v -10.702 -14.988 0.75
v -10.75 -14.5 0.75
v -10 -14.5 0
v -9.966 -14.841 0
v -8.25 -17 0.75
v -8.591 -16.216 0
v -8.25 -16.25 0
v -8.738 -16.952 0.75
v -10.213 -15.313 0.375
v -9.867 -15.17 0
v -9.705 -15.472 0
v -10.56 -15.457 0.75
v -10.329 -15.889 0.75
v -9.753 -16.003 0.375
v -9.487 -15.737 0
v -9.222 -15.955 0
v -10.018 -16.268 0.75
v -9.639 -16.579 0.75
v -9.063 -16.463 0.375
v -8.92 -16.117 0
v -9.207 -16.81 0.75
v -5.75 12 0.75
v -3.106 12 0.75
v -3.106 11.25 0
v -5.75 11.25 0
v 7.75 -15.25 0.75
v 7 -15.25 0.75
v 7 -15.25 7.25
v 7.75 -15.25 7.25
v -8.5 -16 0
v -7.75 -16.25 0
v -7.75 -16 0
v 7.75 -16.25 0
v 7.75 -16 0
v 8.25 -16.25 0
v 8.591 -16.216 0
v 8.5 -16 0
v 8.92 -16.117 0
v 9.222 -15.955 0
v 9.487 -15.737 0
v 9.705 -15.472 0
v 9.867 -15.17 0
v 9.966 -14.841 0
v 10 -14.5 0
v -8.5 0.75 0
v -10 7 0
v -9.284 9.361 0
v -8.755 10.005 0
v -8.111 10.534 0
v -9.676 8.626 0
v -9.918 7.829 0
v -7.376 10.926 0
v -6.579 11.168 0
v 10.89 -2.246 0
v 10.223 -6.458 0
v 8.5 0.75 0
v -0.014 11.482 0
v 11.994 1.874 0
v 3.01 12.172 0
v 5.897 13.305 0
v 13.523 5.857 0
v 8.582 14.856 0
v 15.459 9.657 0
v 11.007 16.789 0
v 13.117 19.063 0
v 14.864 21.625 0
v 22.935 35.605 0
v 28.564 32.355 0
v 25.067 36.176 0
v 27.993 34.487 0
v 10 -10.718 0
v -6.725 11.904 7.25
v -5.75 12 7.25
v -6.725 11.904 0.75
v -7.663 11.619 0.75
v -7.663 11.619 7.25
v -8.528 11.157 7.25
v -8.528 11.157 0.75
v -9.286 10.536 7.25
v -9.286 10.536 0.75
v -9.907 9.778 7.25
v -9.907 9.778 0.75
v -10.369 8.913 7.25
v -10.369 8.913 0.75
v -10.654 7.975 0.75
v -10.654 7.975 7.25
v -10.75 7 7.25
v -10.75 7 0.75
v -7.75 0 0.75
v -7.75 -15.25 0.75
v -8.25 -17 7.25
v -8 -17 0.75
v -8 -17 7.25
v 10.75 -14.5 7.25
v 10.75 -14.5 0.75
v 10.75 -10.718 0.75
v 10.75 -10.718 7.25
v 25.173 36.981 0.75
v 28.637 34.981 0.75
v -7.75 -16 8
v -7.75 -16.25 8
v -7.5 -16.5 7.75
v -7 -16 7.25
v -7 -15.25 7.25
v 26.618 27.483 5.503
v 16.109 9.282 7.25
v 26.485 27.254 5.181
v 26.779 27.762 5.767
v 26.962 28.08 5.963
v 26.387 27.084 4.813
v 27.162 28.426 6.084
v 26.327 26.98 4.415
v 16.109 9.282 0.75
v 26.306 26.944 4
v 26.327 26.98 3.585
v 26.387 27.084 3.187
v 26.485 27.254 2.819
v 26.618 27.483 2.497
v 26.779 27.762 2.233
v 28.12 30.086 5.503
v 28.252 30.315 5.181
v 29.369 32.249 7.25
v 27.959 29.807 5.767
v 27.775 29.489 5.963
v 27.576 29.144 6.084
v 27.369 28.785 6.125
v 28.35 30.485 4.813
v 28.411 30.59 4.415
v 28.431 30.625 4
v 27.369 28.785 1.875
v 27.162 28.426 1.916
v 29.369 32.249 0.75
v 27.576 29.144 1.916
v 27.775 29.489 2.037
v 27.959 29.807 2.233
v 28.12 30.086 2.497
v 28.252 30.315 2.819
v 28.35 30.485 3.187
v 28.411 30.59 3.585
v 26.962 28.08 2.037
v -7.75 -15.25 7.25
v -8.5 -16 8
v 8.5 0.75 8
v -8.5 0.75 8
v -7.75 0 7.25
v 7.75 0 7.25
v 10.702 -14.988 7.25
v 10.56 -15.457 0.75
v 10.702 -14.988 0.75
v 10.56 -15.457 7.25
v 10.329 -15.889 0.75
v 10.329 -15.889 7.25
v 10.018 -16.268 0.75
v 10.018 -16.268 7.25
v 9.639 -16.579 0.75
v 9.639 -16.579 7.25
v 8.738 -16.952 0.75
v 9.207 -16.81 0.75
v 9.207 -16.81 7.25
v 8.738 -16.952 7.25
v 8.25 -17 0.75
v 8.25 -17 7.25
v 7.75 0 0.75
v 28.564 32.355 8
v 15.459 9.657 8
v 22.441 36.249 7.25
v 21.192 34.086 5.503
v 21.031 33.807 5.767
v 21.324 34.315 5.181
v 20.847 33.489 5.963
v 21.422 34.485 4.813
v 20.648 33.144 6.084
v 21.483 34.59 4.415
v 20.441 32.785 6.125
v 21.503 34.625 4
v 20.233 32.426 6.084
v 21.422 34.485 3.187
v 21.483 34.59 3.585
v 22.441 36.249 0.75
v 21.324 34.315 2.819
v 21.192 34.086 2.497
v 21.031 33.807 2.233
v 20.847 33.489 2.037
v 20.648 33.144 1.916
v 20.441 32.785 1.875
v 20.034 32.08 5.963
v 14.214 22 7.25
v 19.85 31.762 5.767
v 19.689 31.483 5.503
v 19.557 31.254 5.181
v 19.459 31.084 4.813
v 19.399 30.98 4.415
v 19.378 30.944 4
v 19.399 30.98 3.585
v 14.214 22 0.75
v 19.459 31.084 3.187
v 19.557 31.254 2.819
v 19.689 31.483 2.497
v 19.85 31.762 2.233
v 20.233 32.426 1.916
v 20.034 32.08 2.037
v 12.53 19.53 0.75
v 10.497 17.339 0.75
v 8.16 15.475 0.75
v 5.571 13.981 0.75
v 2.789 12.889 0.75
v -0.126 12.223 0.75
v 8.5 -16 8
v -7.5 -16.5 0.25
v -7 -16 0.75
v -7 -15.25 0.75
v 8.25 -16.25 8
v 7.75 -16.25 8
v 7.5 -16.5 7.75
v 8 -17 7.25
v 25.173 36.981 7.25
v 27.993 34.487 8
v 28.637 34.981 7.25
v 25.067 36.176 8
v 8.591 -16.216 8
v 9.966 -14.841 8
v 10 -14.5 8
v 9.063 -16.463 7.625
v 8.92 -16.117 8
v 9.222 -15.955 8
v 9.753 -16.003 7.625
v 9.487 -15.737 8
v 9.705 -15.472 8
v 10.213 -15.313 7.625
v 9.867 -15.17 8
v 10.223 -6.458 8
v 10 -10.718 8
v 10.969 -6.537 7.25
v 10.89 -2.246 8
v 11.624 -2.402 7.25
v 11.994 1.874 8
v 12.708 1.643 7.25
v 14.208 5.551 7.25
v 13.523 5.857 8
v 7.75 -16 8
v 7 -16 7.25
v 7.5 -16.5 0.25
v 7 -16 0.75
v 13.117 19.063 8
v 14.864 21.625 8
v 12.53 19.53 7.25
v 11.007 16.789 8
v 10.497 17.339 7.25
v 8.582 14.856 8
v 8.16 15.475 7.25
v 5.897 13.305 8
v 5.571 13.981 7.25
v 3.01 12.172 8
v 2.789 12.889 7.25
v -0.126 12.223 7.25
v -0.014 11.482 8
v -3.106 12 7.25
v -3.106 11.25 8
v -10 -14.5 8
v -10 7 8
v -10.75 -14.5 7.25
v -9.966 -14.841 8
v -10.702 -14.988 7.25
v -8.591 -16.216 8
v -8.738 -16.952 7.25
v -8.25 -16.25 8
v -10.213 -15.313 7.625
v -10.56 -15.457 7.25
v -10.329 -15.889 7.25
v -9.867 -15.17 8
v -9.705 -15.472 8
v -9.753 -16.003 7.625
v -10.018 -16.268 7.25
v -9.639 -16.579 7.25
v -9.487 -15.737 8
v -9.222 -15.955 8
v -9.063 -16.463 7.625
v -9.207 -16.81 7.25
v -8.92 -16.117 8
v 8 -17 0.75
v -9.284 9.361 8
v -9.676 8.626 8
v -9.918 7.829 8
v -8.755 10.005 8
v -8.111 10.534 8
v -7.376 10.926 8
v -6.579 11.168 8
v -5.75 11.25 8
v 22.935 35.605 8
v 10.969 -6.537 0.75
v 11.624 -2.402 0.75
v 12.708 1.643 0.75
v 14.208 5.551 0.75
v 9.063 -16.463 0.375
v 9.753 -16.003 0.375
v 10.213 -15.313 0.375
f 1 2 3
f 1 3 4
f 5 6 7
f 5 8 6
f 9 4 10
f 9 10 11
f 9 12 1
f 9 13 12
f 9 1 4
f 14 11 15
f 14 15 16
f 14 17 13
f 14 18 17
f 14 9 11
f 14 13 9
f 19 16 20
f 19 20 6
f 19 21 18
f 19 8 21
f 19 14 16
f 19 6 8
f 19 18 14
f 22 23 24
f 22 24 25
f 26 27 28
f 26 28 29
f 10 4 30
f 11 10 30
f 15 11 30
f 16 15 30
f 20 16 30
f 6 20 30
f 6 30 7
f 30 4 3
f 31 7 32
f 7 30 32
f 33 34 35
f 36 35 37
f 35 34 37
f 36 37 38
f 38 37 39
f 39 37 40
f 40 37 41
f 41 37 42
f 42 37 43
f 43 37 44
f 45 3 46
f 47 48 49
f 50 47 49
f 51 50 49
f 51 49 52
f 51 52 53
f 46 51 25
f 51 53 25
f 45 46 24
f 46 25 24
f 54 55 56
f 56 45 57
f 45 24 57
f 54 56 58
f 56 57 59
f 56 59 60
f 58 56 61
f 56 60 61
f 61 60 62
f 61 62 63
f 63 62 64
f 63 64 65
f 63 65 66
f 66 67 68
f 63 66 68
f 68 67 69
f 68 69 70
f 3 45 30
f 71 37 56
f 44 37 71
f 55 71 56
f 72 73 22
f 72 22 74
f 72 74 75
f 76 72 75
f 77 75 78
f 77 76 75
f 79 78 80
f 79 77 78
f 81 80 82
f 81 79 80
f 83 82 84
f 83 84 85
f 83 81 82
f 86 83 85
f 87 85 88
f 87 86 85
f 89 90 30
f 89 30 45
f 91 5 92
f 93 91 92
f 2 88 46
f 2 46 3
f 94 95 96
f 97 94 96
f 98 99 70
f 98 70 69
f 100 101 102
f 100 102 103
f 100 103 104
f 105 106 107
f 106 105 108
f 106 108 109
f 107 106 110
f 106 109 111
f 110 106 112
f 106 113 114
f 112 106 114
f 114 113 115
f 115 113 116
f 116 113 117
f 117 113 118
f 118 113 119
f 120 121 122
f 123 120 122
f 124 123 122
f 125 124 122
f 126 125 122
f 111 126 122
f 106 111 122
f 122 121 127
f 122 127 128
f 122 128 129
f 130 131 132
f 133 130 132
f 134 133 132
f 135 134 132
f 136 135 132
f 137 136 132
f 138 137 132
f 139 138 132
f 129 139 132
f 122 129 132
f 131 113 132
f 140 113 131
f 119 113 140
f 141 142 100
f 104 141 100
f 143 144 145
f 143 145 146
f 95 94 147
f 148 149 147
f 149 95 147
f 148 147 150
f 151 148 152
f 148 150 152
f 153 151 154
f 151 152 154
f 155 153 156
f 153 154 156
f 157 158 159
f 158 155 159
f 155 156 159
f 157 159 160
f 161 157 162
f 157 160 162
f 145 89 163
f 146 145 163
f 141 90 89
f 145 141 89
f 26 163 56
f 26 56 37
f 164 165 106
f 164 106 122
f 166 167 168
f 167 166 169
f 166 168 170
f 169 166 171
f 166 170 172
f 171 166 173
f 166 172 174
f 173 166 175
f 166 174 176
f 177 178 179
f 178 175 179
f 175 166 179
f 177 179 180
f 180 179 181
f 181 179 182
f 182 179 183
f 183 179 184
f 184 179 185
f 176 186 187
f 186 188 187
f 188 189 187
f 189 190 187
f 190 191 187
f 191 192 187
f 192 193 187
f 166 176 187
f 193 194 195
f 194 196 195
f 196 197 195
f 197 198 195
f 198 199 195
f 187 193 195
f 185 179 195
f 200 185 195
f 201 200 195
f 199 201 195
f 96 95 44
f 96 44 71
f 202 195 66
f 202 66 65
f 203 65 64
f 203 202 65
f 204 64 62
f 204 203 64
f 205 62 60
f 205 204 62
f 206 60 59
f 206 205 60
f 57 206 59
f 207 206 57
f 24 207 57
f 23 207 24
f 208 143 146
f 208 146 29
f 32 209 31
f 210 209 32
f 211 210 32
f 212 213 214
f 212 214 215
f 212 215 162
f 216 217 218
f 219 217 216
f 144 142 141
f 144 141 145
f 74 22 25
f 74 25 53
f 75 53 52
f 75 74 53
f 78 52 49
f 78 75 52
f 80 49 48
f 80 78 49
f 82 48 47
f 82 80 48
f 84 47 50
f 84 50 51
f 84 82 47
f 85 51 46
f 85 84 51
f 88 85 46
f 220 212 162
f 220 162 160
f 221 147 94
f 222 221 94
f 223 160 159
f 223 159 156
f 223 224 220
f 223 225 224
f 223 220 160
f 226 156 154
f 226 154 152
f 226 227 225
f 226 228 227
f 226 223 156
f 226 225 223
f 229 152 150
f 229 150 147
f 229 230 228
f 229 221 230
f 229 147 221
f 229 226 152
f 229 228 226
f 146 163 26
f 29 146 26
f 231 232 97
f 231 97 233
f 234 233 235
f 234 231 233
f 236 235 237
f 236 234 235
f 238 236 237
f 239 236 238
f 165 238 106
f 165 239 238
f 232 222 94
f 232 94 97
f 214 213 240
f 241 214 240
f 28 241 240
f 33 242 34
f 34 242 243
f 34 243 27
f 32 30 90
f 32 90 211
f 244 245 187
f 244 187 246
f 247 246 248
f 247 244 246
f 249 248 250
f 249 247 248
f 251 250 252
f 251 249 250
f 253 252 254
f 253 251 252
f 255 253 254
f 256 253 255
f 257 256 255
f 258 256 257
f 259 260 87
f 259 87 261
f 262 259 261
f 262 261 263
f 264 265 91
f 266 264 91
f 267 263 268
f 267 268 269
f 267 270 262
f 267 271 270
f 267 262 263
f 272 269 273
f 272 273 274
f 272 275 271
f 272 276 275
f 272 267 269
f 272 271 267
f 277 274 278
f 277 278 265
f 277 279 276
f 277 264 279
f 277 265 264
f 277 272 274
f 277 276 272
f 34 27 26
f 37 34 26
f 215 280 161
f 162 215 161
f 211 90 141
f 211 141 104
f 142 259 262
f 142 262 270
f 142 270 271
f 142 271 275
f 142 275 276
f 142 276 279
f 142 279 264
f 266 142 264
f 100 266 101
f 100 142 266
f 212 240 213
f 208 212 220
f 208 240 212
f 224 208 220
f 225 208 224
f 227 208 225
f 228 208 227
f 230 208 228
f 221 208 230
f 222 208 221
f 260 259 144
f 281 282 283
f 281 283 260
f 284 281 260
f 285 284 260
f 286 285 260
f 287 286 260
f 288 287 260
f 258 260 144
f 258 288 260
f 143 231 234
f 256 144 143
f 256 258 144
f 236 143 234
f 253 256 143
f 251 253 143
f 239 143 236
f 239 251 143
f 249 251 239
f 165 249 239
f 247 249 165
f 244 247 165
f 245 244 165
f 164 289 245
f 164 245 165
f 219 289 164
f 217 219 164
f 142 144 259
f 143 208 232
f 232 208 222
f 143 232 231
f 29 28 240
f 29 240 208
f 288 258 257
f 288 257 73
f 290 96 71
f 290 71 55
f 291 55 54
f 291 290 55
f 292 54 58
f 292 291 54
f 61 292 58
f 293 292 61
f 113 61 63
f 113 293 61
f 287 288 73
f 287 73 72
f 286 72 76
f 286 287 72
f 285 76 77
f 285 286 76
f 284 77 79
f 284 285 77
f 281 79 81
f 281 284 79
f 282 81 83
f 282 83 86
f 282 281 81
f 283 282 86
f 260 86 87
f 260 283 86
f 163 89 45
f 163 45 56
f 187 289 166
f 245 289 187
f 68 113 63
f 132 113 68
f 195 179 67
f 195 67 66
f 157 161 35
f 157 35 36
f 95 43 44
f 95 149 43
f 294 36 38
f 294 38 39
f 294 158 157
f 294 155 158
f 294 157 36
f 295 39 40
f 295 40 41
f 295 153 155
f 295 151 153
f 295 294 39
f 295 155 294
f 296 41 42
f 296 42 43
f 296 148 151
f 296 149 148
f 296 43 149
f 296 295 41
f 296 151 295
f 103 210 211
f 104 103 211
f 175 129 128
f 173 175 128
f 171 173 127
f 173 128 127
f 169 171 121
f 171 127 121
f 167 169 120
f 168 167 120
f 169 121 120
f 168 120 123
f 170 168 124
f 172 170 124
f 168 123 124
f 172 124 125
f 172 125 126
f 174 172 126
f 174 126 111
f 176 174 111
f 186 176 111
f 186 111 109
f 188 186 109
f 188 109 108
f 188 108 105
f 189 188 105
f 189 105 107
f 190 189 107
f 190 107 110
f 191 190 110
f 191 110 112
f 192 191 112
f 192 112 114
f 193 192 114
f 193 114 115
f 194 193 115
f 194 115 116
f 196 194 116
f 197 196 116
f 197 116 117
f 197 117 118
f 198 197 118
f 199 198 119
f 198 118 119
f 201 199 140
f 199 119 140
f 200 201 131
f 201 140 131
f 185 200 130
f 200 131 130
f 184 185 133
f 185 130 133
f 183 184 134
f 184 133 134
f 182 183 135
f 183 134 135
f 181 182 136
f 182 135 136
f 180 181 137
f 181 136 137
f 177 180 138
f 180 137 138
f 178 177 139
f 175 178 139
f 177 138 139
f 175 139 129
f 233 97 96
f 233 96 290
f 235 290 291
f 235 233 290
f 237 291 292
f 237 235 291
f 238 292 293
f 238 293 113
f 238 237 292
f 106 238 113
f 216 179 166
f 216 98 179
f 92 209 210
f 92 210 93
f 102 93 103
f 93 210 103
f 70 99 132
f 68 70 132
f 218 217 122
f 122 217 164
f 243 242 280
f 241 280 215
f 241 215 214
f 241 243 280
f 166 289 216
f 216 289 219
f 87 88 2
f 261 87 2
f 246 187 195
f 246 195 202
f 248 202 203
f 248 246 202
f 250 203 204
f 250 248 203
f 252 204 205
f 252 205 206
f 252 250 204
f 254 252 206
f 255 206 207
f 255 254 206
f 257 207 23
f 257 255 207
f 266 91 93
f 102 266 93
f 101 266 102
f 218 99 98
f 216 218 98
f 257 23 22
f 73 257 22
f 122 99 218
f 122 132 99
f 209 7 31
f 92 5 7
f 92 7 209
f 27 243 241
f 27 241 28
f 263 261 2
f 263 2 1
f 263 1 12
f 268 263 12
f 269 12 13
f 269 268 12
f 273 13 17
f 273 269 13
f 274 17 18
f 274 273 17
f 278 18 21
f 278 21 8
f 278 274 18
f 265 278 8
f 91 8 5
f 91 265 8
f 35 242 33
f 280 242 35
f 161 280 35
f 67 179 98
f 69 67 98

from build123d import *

# Parameters (mm, degrees)
F0_W     = 0.75
F0_H     = 1.75
F1_DEPTH = 8
F2_R     = 40
F3_R     = 20
F4_R     = 5
F5_R     = 2.5
F6_SIZE  = 2
F7_R     = 2.125
F8_DEPTH = 37.1109272381
F9_SIZE  = 0.75
F10_SIZE = 1


with BuildPart() as f1:
    # F0 (on Top) → F1 (new body)
    with BuildSketch(Plane.XY):
        Polygon((-10.75, -17), (-7.75, -17), (-7.75, -15.25), (-7.75, 0), (7.75, 0), (7.75, -15.25), (7.75, -17), (10.75, -17), (10.75, 0), (30.3688021535, 33.9807621135), (23.4405989232, 37.9807621135), (8.4405989232, 12), (-10.75, 12), align=None)
        with Locations((-7.375, -16.125)):
            Rectangle(F0_W, F0_H)
        with Locations((7.375, -16.125)):
            Rectangle(F0_W, F0_H)
    extrude(amount=F1_DEPTH)

    # F2
    f2_edges = [f1.edges().sort_by_distance(p)[0] for p in [
        (10.75, 0, 4),
    ]]
    fillet(f2_edges, radius=F2_R)

    # F3
    f3_edges = [f1.edges().sort_by_distance(p)[0] for p in [
        (8.440599, 12, 4),
    ]]
    fillet(f3_edges, radius=F3_R)

    # F4
    f4_edges = [f1.edges().sort_by_distance(p)[0] for p in [
        (-10.75, 12, 4),
    ]]
    fillet(f4_edges, radius=F4_R)

    # F5
    f5_edges = [f1.edges().sort_by_distance(p)[0] for p in [
        (10.75, -17, 4),
        (-10.75, -17, 4),
    ]]
    fillet(f5_edges, radius=F5_R)

    # F6
    f6_edges = [f1.edges().sort_by_distance(p)[0] for p in [
        (30.368802, 33.980762, 4),
        (23.440599, 37.980762, 4),
    ]]
    chamfer(f6_edges, length=F6_SIZE)

    # F7 (on face) → F8 (cut, through all)
    with BuildSketch(Plane(origin=(8.0625, -4.6548865453, 0), x_dir=(0.5, 0.8660254038, 0), z_dir=(0.8660254038, -0.5, 0))):
        with Locations((38.612604307, 4)):
            Circle(F7_R)
    extrude(amount=-F8_DEPTH, mode=Mode.SUBTRACT)

    # F9
    f9_edges = [f1.edges().sort_by_distance(p)[0] for p in [
        (18.32735, 29.124356, 8),
        (23.806624, 36.614737, 8),
        (6.893594, 14.679492, 8),
        (26.904701, 35.980762, 8),
        (-4.428203, 12, 8),
        (29.002777, 33.614737, 8),
        (-9.285534, 10.535534, 8),
        (22.738893, 20.765372, 8),
        (-10.75, -3.75, 8),
        (12.112967, -0.365206, 8),
        (-10.017767, -16.267767, 8),
        (10.75, -12.608984, 8),
        (-7.625, -17, 8),
        (10.017767, -16.267767, 8),
        (-7, -16.125, 8),
        (7.625, -17, 8),
        (-7.375, -15.25, 8),
        (7, -16.125, 8),
        (-7.75, -7.625, 8),
        (7.375, -15.25, 8),
        (0, 0, 8),
        (7.75, -7.625, 8),
        (18.32735, 29.124356, 0),
        (23.806624, 36.614737, 0),
        (6.893594, 14.679492, 0),
        (26.904701, 35.980762, 0),
        (-4.428203, 12, 0),
        (29.002777, 33.614737, 0),
        (-9.285534, 10.535534, 0),
        (22.738893, 20.765372, 0),
        (-10.75, -3.75, 0),
        (12.112967, -0.365206, 0),
        (-10.017767, -16.267767, 0),
        (10.75, -12.608984, 0),
        (-7.625, -17, 0),
        (10.017767, -16.267767, 0),
        (-7, -16.125, 0),
        (7.625, -17, 0),
        (-7.375, -15.25, 0),
        (7, -16.125, 0),
        (-7.75, -7.625, 0),
        (7.375, -15.25, 0),
        (0, 0, 0),
        (7.75, -7.625, 0),
    ]]
    chamfer(f9_edges, length=F9_SIZE)

    # F10
    f10_edges = [f1.edges().sort_by_distance(p)[0] for p in [
        (-7, -17, 4),
        (7, -17, 4),
    ]]
    chamfer(f10_edges, length=F10_SIZE)


solid = f1.part
